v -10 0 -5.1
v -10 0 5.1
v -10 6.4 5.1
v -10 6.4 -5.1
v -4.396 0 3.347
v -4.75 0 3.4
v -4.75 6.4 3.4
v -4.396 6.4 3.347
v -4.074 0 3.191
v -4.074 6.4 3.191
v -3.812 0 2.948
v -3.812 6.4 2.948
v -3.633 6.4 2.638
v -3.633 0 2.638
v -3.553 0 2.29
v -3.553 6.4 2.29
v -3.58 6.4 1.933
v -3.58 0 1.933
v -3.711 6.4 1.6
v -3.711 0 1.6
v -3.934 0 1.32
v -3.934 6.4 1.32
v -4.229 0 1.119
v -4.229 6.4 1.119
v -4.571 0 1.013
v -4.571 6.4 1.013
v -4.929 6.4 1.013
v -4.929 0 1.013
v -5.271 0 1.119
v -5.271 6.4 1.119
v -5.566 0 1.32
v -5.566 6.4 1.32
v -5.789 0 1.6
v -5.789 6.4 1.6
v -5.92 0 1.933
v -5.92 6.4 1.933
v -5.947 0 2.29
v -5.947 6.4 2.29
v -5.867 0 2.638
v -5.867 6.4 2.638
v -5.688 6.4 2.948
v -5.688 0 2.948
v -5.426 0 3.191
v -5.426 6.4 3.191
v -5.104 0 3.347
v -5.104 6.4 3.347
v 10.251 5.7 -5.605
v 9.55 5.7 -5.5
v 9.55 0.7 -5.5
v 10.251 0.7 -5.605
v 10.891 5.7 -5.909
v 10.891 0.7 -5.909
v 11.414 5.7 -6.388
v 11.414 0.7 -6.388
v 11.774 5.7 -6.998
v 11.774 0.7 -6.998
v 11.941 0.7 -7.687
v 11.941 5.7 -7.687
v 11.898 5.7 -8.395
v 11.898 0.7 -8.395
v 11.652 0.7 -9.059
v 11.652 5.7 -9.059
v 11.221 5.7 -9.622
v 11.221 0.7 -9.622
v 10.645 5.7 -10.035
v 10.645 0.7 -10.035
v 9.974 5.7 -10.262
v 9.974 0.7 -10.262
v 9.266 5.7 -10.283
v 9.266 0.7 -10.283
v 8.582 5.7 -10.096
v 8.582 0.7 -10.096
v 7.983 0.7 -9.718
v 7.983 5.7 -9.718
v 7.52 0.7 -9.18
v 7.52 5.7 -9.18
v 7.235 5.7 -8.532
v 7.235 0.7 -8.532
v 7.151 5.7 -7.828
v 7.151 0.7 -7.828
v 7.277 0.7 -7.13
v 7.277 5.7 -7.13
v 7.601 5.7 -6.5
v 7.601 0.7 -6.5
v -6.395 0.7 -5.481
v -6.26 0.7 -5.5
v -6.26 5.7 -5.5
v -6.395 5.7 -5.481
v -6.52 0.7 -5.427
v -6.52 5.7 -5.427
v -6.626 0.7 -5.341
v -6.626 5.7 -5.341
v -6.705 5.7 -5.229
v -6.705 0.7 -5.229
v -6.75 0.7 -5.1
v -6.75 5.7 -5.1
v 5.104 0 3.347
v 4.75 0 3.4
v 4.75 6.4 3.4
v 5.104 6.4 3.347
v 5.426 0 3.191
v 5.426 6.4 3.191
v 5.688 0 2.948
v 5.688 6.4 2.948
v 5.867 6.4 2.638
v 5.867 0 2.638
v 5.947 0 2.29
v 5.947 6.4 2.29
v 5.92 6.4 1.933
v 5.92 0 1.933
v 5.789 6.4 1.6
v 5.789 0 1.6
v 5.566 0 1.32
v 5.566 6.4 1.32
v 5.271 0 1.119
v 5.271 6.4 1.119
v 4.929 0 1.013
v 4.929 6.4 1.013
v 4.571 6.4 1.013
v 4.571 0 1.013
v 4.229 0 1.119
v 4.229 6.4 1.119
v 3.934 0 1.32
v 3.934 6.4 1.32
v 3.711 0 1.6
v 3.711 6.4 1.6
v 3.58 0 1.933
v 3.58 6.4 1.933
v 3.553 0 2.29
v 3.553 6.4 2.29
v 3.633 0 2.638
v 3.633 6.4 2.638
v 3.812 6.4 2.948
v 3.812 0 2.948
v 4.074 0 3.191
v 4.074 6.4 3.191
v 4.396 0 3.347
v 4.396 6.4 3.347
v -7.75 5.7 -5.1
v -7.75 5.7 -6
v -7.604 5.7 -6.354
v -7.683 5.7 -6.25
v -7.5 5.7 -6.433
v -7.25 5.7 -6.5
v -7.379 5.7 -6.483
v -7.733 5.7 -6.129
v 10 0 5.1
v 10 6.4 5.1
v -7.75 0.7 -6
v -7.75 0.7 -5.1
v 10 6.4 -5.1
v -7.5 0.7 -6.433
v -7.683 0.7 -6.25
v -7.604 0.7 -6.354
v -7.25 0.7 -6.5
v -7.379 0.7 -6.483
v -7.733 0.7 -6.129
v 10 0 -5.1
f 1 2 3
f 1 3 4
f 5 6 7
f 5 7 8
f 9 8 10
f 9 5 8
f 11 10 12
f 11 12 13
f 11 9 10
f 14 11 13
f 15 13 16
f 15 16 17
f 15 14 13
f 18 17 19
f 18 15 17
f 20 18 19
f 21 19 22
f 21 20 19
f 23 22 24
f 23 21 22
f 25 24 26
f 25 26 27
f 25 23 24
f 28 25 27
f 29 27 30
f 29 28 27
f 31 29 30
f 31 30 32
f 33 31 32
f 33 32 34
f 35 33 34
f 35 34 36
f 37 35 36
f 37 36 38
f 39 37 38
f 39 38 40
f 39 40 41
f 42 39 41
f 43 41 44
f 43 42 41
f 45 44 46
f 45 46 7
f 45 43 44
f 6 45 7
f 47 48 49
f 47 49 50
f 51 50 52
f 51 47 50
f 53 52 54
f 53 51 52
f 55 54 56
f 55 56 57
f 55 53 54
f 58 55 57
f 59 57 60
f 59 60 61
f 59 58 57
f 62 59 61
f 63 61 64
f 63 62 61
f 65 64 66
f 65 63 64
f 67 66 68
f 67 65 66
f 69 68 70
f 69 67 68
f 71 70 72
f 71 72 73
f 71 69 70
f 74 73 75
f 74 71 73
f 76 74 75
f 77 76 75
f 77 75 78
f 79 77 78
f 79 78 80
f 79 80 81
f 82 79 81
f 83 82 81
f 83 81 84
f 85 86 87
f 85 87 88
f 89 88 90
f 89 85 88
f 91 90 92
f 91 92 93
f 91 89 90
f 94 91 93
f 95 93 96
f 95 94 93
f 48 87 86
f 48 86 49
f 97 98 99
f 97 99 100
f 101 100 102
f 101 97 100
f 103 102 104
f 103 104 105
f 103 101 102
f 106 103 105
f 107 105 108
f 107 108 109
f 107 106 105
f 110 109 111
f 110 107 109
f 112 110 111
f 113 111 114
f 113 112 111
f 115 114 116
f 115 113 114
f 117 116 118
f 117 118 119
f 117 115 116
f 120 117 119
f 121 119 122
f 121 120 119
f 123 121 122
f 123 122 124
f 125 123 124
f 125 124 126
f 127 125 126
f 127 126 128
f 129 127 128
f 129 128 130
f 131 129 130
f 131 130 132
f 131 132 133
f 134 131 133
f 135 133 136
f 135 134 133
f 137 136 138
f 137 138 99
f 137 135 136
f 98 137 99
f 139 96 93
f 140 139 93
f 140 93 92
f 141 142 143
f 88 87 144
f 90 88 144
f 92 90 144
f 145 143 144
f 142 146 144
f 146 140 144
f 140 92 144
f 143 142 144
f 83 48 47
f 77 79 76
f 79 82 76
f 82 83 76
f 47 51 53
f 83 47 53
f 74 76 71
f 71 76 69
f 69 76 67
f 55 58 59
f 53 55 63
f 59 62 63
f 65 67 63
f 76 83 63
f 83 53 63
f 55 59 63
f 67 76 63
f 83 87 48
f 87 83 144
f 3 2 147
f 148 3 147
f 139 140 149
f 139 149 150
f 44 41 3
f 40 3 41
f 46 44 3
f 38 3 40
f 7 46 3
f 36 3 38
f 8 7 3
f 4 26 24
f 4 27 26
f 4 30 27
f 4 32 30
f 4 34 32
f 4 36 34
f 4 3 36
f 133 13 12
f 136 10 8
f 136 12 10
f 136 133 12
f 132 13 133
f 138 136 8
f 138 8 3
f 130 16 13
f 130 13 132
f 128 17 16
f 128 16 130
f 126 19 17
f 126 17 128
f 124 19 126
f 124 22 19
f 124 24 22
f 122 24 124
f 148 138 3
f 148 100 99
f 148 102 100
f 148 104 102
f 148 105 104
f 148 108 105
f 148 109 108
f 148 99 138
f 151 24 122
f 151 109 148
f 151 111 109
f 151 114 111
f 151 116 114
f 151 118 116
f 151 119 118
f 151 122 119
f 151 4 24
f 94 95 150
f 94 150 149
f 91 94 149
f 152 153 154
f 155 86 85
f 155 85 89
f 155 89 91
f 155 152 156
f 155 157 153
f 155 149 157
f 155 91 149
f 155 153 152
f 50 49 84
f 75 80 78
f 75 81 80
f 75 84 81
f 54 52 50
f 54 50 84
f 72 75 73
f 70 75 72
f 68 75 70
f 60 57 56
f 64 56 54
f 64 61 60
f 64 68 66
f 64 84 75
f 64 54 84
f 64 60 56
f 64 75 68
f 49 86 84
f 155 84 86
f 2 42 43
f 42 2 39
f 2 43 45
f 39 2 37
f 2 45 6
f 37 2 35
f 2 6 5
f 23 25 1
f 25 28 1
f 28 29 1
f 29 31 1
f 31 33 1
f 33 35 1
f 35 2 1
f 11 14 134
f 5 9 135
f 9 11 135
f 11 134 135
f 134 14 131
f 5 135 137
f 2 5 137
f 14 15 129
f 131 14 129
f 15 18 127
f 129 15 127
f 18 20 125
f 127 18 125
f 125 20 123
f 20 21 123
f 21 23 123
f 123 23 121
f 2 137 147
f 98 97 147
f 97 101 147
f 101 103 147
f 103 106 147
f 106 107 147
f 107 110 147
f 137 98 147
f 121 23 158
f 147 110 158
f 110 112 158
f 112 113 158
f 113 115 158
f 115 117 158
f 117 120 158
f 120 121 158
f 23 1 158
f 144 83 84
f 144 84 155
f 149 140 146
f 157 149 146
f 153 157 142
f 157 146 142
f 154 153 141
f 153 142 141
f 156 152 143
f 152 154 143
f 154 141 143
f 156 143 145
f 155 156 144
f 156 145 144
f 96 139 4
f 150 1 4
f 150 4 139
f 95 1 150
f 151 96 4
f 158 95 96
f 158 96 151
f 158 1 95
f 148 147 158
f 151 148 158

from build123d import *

# Parameters (mm, degrees)
SKETCH1_W           = 20
SKETCH1_H           = 10.2
SKETCH1_R           = 1.2
BOSS_EXTRUDE1_DEPTH = 6.4
BOSS_EXTRUDE2_DEPTH = 2.5
FILLET1_R           = 0.5


with BuildPart() as part:
    # Sketch1 → Boss-Extrude1 (new body)
    with BuildSketch(Plane(origin=(0, 0, 0), x_dir=(1, 0, 0), z_dir=(0, 1, 0))):
        Rectangle(SKETCH1_W, SKETCH1_H)
        with Locations(Location((-4.75, -2.2, 0), (0, 0, 270))):
            Circle(SKETCH1_R, mode=Mode.SUBTRACT)
        with Locations(Location((4.75, -2.2, 0), (0, 0, 270))):
            Circle(SKETCH1_R, mode=Mode.SUBTRACT)
    extrude(amount=BOSS_EXTRUDE1_DEPTH)

    # Sketch4 → Boss-Extrude2 (add, symmetric)
    with BuildSketch(Plane(origin=(0, 3.2, 0), x_dir=(1, 0, 0), z_dir=(0, 1, 0))):
        with BuildLine():
            Line((-6.75, 5.1), (-6.75, 5.5))
            Line((-6.75, 5.5), (9.55, 5.5))
            ThreePointArc((9.55, 5.5), (10.645445115, 10.03541565), (7.600641131, 6.5))
            Line((7.600641131, 6.5), (-7.75, 6.5))
            Line((-7.75, 6.5), (-7.75, 5.1))
            Line((-7.75, 5.1), (-6.75, 5.1))
        make_face()
    extrude(amount=BOSS_EXTRUDE2_DEPTH, both=True)

    # Fillet1
    # the kernel refuses this fillet: 0.5 mm, written as the material it adds along each edge
    with BuildSketch(Plane(origin=(-6.75, 0.7, -5.5), x_dir=(1.5765166949672097e-12, 0, 1.0), z_dir=(0, 1, 0))) as fillet1_piece_1:
        with BuildLine():
            CenterArc((0.5, 0.489897949), FILLET1_R, 180, 78.463040967)
            Line((0, 0.489897949), (0, 0))
            Line((0, 0), (0.4, 0))
        make_face()
    extrude(amount=5)
    # the kernel refuses this fillet: 0.5 mm, written as the material it takes off along each edge
    with BuildSketch(Plane(origin=(-7.75, 6.95, -6.5), x_dir=(0, 0, 1), z_dir=(0, -1, 0))) as fillet1_2_piece_1:
        with BuildLine():
            CenterArc((FILLET1_R, -FILLET1_R), FILLET1_R, 90, 90)
            Line((0, -FILLET1_R), (0, 0))
            Line((0, 0), (FILLET1_R, 0))
        make_face()
    extrude(amount=7.5, mode=Mode.SUBTRACT)


solid = part.part
